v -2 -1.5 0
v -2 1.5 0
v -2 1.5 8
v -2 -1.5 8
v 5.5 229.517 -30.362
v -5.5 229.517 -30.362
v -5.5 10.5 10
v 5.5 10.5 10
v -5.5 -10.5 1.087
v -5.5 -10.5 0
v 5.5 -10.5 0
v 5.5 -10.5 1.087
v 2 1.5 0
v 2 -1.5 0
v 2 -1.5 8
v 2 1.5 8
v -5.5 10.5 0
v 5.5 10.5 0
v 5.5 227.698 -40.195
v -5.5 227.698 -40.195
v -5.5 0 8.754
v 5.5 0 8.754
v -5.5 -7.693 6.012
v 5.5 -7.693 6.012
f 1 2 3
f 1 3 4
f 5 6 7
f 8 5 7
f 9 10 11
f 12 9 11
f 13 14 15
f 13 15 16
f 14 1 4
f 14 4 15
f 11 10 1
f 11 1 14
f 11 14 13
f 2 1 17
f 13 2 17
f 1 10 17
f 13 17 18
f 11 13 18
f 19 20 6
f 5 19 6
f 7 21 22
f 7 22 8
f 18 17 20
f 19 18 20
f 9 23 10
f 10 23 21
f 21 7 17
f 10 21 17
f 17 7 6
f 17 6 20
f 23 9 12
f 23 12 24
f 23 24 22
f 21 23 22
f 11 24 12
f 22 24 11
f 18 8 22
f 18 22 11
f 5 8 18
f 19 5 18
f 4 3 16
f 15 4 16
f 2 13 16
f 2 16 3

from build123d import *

# Parameters (mm, degrees)
SKETCH3_W                = 11
SKETCH3_H                = 21
BOSS_EXTRUDE1_DEPTH      = 10
CUT_EXTRUDE1_DEPTH       = 8
CUT_EXTRUDE5_DEPTH       = 8
CUT_EXTRUDE5_DEPTH_BACK  = 8
BOSS_EXTRUDE2_DEPTH      = 5.5
BOSS_EXTRUDE2_DEPTH_BACK = 5.5


with BuildPart() as part:
    # Sketch3 → Boss-Extrude1 (new body)
    with BuildSketch(Plane.XY):
        Rectangle(SKETCH3_W, SKETCH3_H)
    extrude(amount=BOSS_EXTRUDE1_DEPTH)

    # Sketch5 → Cut-Extrude1 (cut)
    with BuildSketch(Plane.XY):
        Polygon((0, 1.5), (-2, 1.5), (-2, -1.5), (2, -1.5), (2, 1.5), align=None)
    extrude(amount=CUT_EXTRUDE1_DEPTH, mode=Mode.SUBTRACT)

    # Sketch6 → Cut-Extrude5 (cut, two sides: drawn at the far end of the back side and taken through both)
    with BuildSketch(Plane(origin=(0, 0, 0), x_dir=(0, 0, -1), z_dir=(1, 0, 0)).offset(-CUT_EXTRUDE5_DEPTH_BACK)):
        Polygon((-1.0867085, -10.5), (-6.011599163, -7.693477847), (-8.753565317, 0), (-10, 10.5), (-10, -10.5), (-10, -11.324459918), (-1.0867085, -10.760658811), align=None)
    extrude(amount=CUT_EXTRUDE5_DEPTH + CUT_EXTRUDE5_DEPTH_BACK, mode=Mode.SUBTRACT)

    # Sketch18 → Boss-Extrude2 (add, two sides: drawn at the far end of the back side and taken through both)
    with BuildSketch(Plane(origin=(0, 0, 0), x_dir=(0, 0, -1), z_dir=(1, 0, 0)).offset(-BOSS_EXTRUDE2_DEPTH_BACK)):
        Polygon((0, 10.5), (40.195441972, 227.697760834), (30.362408276, 229.51749937), (-10, 10.5), align=None)
    extrude(amount=BOSS_EXTRUDE2_DEPTH + BOSS_EXTRUDE2_DEPTH_BACK)


solid = part.part
